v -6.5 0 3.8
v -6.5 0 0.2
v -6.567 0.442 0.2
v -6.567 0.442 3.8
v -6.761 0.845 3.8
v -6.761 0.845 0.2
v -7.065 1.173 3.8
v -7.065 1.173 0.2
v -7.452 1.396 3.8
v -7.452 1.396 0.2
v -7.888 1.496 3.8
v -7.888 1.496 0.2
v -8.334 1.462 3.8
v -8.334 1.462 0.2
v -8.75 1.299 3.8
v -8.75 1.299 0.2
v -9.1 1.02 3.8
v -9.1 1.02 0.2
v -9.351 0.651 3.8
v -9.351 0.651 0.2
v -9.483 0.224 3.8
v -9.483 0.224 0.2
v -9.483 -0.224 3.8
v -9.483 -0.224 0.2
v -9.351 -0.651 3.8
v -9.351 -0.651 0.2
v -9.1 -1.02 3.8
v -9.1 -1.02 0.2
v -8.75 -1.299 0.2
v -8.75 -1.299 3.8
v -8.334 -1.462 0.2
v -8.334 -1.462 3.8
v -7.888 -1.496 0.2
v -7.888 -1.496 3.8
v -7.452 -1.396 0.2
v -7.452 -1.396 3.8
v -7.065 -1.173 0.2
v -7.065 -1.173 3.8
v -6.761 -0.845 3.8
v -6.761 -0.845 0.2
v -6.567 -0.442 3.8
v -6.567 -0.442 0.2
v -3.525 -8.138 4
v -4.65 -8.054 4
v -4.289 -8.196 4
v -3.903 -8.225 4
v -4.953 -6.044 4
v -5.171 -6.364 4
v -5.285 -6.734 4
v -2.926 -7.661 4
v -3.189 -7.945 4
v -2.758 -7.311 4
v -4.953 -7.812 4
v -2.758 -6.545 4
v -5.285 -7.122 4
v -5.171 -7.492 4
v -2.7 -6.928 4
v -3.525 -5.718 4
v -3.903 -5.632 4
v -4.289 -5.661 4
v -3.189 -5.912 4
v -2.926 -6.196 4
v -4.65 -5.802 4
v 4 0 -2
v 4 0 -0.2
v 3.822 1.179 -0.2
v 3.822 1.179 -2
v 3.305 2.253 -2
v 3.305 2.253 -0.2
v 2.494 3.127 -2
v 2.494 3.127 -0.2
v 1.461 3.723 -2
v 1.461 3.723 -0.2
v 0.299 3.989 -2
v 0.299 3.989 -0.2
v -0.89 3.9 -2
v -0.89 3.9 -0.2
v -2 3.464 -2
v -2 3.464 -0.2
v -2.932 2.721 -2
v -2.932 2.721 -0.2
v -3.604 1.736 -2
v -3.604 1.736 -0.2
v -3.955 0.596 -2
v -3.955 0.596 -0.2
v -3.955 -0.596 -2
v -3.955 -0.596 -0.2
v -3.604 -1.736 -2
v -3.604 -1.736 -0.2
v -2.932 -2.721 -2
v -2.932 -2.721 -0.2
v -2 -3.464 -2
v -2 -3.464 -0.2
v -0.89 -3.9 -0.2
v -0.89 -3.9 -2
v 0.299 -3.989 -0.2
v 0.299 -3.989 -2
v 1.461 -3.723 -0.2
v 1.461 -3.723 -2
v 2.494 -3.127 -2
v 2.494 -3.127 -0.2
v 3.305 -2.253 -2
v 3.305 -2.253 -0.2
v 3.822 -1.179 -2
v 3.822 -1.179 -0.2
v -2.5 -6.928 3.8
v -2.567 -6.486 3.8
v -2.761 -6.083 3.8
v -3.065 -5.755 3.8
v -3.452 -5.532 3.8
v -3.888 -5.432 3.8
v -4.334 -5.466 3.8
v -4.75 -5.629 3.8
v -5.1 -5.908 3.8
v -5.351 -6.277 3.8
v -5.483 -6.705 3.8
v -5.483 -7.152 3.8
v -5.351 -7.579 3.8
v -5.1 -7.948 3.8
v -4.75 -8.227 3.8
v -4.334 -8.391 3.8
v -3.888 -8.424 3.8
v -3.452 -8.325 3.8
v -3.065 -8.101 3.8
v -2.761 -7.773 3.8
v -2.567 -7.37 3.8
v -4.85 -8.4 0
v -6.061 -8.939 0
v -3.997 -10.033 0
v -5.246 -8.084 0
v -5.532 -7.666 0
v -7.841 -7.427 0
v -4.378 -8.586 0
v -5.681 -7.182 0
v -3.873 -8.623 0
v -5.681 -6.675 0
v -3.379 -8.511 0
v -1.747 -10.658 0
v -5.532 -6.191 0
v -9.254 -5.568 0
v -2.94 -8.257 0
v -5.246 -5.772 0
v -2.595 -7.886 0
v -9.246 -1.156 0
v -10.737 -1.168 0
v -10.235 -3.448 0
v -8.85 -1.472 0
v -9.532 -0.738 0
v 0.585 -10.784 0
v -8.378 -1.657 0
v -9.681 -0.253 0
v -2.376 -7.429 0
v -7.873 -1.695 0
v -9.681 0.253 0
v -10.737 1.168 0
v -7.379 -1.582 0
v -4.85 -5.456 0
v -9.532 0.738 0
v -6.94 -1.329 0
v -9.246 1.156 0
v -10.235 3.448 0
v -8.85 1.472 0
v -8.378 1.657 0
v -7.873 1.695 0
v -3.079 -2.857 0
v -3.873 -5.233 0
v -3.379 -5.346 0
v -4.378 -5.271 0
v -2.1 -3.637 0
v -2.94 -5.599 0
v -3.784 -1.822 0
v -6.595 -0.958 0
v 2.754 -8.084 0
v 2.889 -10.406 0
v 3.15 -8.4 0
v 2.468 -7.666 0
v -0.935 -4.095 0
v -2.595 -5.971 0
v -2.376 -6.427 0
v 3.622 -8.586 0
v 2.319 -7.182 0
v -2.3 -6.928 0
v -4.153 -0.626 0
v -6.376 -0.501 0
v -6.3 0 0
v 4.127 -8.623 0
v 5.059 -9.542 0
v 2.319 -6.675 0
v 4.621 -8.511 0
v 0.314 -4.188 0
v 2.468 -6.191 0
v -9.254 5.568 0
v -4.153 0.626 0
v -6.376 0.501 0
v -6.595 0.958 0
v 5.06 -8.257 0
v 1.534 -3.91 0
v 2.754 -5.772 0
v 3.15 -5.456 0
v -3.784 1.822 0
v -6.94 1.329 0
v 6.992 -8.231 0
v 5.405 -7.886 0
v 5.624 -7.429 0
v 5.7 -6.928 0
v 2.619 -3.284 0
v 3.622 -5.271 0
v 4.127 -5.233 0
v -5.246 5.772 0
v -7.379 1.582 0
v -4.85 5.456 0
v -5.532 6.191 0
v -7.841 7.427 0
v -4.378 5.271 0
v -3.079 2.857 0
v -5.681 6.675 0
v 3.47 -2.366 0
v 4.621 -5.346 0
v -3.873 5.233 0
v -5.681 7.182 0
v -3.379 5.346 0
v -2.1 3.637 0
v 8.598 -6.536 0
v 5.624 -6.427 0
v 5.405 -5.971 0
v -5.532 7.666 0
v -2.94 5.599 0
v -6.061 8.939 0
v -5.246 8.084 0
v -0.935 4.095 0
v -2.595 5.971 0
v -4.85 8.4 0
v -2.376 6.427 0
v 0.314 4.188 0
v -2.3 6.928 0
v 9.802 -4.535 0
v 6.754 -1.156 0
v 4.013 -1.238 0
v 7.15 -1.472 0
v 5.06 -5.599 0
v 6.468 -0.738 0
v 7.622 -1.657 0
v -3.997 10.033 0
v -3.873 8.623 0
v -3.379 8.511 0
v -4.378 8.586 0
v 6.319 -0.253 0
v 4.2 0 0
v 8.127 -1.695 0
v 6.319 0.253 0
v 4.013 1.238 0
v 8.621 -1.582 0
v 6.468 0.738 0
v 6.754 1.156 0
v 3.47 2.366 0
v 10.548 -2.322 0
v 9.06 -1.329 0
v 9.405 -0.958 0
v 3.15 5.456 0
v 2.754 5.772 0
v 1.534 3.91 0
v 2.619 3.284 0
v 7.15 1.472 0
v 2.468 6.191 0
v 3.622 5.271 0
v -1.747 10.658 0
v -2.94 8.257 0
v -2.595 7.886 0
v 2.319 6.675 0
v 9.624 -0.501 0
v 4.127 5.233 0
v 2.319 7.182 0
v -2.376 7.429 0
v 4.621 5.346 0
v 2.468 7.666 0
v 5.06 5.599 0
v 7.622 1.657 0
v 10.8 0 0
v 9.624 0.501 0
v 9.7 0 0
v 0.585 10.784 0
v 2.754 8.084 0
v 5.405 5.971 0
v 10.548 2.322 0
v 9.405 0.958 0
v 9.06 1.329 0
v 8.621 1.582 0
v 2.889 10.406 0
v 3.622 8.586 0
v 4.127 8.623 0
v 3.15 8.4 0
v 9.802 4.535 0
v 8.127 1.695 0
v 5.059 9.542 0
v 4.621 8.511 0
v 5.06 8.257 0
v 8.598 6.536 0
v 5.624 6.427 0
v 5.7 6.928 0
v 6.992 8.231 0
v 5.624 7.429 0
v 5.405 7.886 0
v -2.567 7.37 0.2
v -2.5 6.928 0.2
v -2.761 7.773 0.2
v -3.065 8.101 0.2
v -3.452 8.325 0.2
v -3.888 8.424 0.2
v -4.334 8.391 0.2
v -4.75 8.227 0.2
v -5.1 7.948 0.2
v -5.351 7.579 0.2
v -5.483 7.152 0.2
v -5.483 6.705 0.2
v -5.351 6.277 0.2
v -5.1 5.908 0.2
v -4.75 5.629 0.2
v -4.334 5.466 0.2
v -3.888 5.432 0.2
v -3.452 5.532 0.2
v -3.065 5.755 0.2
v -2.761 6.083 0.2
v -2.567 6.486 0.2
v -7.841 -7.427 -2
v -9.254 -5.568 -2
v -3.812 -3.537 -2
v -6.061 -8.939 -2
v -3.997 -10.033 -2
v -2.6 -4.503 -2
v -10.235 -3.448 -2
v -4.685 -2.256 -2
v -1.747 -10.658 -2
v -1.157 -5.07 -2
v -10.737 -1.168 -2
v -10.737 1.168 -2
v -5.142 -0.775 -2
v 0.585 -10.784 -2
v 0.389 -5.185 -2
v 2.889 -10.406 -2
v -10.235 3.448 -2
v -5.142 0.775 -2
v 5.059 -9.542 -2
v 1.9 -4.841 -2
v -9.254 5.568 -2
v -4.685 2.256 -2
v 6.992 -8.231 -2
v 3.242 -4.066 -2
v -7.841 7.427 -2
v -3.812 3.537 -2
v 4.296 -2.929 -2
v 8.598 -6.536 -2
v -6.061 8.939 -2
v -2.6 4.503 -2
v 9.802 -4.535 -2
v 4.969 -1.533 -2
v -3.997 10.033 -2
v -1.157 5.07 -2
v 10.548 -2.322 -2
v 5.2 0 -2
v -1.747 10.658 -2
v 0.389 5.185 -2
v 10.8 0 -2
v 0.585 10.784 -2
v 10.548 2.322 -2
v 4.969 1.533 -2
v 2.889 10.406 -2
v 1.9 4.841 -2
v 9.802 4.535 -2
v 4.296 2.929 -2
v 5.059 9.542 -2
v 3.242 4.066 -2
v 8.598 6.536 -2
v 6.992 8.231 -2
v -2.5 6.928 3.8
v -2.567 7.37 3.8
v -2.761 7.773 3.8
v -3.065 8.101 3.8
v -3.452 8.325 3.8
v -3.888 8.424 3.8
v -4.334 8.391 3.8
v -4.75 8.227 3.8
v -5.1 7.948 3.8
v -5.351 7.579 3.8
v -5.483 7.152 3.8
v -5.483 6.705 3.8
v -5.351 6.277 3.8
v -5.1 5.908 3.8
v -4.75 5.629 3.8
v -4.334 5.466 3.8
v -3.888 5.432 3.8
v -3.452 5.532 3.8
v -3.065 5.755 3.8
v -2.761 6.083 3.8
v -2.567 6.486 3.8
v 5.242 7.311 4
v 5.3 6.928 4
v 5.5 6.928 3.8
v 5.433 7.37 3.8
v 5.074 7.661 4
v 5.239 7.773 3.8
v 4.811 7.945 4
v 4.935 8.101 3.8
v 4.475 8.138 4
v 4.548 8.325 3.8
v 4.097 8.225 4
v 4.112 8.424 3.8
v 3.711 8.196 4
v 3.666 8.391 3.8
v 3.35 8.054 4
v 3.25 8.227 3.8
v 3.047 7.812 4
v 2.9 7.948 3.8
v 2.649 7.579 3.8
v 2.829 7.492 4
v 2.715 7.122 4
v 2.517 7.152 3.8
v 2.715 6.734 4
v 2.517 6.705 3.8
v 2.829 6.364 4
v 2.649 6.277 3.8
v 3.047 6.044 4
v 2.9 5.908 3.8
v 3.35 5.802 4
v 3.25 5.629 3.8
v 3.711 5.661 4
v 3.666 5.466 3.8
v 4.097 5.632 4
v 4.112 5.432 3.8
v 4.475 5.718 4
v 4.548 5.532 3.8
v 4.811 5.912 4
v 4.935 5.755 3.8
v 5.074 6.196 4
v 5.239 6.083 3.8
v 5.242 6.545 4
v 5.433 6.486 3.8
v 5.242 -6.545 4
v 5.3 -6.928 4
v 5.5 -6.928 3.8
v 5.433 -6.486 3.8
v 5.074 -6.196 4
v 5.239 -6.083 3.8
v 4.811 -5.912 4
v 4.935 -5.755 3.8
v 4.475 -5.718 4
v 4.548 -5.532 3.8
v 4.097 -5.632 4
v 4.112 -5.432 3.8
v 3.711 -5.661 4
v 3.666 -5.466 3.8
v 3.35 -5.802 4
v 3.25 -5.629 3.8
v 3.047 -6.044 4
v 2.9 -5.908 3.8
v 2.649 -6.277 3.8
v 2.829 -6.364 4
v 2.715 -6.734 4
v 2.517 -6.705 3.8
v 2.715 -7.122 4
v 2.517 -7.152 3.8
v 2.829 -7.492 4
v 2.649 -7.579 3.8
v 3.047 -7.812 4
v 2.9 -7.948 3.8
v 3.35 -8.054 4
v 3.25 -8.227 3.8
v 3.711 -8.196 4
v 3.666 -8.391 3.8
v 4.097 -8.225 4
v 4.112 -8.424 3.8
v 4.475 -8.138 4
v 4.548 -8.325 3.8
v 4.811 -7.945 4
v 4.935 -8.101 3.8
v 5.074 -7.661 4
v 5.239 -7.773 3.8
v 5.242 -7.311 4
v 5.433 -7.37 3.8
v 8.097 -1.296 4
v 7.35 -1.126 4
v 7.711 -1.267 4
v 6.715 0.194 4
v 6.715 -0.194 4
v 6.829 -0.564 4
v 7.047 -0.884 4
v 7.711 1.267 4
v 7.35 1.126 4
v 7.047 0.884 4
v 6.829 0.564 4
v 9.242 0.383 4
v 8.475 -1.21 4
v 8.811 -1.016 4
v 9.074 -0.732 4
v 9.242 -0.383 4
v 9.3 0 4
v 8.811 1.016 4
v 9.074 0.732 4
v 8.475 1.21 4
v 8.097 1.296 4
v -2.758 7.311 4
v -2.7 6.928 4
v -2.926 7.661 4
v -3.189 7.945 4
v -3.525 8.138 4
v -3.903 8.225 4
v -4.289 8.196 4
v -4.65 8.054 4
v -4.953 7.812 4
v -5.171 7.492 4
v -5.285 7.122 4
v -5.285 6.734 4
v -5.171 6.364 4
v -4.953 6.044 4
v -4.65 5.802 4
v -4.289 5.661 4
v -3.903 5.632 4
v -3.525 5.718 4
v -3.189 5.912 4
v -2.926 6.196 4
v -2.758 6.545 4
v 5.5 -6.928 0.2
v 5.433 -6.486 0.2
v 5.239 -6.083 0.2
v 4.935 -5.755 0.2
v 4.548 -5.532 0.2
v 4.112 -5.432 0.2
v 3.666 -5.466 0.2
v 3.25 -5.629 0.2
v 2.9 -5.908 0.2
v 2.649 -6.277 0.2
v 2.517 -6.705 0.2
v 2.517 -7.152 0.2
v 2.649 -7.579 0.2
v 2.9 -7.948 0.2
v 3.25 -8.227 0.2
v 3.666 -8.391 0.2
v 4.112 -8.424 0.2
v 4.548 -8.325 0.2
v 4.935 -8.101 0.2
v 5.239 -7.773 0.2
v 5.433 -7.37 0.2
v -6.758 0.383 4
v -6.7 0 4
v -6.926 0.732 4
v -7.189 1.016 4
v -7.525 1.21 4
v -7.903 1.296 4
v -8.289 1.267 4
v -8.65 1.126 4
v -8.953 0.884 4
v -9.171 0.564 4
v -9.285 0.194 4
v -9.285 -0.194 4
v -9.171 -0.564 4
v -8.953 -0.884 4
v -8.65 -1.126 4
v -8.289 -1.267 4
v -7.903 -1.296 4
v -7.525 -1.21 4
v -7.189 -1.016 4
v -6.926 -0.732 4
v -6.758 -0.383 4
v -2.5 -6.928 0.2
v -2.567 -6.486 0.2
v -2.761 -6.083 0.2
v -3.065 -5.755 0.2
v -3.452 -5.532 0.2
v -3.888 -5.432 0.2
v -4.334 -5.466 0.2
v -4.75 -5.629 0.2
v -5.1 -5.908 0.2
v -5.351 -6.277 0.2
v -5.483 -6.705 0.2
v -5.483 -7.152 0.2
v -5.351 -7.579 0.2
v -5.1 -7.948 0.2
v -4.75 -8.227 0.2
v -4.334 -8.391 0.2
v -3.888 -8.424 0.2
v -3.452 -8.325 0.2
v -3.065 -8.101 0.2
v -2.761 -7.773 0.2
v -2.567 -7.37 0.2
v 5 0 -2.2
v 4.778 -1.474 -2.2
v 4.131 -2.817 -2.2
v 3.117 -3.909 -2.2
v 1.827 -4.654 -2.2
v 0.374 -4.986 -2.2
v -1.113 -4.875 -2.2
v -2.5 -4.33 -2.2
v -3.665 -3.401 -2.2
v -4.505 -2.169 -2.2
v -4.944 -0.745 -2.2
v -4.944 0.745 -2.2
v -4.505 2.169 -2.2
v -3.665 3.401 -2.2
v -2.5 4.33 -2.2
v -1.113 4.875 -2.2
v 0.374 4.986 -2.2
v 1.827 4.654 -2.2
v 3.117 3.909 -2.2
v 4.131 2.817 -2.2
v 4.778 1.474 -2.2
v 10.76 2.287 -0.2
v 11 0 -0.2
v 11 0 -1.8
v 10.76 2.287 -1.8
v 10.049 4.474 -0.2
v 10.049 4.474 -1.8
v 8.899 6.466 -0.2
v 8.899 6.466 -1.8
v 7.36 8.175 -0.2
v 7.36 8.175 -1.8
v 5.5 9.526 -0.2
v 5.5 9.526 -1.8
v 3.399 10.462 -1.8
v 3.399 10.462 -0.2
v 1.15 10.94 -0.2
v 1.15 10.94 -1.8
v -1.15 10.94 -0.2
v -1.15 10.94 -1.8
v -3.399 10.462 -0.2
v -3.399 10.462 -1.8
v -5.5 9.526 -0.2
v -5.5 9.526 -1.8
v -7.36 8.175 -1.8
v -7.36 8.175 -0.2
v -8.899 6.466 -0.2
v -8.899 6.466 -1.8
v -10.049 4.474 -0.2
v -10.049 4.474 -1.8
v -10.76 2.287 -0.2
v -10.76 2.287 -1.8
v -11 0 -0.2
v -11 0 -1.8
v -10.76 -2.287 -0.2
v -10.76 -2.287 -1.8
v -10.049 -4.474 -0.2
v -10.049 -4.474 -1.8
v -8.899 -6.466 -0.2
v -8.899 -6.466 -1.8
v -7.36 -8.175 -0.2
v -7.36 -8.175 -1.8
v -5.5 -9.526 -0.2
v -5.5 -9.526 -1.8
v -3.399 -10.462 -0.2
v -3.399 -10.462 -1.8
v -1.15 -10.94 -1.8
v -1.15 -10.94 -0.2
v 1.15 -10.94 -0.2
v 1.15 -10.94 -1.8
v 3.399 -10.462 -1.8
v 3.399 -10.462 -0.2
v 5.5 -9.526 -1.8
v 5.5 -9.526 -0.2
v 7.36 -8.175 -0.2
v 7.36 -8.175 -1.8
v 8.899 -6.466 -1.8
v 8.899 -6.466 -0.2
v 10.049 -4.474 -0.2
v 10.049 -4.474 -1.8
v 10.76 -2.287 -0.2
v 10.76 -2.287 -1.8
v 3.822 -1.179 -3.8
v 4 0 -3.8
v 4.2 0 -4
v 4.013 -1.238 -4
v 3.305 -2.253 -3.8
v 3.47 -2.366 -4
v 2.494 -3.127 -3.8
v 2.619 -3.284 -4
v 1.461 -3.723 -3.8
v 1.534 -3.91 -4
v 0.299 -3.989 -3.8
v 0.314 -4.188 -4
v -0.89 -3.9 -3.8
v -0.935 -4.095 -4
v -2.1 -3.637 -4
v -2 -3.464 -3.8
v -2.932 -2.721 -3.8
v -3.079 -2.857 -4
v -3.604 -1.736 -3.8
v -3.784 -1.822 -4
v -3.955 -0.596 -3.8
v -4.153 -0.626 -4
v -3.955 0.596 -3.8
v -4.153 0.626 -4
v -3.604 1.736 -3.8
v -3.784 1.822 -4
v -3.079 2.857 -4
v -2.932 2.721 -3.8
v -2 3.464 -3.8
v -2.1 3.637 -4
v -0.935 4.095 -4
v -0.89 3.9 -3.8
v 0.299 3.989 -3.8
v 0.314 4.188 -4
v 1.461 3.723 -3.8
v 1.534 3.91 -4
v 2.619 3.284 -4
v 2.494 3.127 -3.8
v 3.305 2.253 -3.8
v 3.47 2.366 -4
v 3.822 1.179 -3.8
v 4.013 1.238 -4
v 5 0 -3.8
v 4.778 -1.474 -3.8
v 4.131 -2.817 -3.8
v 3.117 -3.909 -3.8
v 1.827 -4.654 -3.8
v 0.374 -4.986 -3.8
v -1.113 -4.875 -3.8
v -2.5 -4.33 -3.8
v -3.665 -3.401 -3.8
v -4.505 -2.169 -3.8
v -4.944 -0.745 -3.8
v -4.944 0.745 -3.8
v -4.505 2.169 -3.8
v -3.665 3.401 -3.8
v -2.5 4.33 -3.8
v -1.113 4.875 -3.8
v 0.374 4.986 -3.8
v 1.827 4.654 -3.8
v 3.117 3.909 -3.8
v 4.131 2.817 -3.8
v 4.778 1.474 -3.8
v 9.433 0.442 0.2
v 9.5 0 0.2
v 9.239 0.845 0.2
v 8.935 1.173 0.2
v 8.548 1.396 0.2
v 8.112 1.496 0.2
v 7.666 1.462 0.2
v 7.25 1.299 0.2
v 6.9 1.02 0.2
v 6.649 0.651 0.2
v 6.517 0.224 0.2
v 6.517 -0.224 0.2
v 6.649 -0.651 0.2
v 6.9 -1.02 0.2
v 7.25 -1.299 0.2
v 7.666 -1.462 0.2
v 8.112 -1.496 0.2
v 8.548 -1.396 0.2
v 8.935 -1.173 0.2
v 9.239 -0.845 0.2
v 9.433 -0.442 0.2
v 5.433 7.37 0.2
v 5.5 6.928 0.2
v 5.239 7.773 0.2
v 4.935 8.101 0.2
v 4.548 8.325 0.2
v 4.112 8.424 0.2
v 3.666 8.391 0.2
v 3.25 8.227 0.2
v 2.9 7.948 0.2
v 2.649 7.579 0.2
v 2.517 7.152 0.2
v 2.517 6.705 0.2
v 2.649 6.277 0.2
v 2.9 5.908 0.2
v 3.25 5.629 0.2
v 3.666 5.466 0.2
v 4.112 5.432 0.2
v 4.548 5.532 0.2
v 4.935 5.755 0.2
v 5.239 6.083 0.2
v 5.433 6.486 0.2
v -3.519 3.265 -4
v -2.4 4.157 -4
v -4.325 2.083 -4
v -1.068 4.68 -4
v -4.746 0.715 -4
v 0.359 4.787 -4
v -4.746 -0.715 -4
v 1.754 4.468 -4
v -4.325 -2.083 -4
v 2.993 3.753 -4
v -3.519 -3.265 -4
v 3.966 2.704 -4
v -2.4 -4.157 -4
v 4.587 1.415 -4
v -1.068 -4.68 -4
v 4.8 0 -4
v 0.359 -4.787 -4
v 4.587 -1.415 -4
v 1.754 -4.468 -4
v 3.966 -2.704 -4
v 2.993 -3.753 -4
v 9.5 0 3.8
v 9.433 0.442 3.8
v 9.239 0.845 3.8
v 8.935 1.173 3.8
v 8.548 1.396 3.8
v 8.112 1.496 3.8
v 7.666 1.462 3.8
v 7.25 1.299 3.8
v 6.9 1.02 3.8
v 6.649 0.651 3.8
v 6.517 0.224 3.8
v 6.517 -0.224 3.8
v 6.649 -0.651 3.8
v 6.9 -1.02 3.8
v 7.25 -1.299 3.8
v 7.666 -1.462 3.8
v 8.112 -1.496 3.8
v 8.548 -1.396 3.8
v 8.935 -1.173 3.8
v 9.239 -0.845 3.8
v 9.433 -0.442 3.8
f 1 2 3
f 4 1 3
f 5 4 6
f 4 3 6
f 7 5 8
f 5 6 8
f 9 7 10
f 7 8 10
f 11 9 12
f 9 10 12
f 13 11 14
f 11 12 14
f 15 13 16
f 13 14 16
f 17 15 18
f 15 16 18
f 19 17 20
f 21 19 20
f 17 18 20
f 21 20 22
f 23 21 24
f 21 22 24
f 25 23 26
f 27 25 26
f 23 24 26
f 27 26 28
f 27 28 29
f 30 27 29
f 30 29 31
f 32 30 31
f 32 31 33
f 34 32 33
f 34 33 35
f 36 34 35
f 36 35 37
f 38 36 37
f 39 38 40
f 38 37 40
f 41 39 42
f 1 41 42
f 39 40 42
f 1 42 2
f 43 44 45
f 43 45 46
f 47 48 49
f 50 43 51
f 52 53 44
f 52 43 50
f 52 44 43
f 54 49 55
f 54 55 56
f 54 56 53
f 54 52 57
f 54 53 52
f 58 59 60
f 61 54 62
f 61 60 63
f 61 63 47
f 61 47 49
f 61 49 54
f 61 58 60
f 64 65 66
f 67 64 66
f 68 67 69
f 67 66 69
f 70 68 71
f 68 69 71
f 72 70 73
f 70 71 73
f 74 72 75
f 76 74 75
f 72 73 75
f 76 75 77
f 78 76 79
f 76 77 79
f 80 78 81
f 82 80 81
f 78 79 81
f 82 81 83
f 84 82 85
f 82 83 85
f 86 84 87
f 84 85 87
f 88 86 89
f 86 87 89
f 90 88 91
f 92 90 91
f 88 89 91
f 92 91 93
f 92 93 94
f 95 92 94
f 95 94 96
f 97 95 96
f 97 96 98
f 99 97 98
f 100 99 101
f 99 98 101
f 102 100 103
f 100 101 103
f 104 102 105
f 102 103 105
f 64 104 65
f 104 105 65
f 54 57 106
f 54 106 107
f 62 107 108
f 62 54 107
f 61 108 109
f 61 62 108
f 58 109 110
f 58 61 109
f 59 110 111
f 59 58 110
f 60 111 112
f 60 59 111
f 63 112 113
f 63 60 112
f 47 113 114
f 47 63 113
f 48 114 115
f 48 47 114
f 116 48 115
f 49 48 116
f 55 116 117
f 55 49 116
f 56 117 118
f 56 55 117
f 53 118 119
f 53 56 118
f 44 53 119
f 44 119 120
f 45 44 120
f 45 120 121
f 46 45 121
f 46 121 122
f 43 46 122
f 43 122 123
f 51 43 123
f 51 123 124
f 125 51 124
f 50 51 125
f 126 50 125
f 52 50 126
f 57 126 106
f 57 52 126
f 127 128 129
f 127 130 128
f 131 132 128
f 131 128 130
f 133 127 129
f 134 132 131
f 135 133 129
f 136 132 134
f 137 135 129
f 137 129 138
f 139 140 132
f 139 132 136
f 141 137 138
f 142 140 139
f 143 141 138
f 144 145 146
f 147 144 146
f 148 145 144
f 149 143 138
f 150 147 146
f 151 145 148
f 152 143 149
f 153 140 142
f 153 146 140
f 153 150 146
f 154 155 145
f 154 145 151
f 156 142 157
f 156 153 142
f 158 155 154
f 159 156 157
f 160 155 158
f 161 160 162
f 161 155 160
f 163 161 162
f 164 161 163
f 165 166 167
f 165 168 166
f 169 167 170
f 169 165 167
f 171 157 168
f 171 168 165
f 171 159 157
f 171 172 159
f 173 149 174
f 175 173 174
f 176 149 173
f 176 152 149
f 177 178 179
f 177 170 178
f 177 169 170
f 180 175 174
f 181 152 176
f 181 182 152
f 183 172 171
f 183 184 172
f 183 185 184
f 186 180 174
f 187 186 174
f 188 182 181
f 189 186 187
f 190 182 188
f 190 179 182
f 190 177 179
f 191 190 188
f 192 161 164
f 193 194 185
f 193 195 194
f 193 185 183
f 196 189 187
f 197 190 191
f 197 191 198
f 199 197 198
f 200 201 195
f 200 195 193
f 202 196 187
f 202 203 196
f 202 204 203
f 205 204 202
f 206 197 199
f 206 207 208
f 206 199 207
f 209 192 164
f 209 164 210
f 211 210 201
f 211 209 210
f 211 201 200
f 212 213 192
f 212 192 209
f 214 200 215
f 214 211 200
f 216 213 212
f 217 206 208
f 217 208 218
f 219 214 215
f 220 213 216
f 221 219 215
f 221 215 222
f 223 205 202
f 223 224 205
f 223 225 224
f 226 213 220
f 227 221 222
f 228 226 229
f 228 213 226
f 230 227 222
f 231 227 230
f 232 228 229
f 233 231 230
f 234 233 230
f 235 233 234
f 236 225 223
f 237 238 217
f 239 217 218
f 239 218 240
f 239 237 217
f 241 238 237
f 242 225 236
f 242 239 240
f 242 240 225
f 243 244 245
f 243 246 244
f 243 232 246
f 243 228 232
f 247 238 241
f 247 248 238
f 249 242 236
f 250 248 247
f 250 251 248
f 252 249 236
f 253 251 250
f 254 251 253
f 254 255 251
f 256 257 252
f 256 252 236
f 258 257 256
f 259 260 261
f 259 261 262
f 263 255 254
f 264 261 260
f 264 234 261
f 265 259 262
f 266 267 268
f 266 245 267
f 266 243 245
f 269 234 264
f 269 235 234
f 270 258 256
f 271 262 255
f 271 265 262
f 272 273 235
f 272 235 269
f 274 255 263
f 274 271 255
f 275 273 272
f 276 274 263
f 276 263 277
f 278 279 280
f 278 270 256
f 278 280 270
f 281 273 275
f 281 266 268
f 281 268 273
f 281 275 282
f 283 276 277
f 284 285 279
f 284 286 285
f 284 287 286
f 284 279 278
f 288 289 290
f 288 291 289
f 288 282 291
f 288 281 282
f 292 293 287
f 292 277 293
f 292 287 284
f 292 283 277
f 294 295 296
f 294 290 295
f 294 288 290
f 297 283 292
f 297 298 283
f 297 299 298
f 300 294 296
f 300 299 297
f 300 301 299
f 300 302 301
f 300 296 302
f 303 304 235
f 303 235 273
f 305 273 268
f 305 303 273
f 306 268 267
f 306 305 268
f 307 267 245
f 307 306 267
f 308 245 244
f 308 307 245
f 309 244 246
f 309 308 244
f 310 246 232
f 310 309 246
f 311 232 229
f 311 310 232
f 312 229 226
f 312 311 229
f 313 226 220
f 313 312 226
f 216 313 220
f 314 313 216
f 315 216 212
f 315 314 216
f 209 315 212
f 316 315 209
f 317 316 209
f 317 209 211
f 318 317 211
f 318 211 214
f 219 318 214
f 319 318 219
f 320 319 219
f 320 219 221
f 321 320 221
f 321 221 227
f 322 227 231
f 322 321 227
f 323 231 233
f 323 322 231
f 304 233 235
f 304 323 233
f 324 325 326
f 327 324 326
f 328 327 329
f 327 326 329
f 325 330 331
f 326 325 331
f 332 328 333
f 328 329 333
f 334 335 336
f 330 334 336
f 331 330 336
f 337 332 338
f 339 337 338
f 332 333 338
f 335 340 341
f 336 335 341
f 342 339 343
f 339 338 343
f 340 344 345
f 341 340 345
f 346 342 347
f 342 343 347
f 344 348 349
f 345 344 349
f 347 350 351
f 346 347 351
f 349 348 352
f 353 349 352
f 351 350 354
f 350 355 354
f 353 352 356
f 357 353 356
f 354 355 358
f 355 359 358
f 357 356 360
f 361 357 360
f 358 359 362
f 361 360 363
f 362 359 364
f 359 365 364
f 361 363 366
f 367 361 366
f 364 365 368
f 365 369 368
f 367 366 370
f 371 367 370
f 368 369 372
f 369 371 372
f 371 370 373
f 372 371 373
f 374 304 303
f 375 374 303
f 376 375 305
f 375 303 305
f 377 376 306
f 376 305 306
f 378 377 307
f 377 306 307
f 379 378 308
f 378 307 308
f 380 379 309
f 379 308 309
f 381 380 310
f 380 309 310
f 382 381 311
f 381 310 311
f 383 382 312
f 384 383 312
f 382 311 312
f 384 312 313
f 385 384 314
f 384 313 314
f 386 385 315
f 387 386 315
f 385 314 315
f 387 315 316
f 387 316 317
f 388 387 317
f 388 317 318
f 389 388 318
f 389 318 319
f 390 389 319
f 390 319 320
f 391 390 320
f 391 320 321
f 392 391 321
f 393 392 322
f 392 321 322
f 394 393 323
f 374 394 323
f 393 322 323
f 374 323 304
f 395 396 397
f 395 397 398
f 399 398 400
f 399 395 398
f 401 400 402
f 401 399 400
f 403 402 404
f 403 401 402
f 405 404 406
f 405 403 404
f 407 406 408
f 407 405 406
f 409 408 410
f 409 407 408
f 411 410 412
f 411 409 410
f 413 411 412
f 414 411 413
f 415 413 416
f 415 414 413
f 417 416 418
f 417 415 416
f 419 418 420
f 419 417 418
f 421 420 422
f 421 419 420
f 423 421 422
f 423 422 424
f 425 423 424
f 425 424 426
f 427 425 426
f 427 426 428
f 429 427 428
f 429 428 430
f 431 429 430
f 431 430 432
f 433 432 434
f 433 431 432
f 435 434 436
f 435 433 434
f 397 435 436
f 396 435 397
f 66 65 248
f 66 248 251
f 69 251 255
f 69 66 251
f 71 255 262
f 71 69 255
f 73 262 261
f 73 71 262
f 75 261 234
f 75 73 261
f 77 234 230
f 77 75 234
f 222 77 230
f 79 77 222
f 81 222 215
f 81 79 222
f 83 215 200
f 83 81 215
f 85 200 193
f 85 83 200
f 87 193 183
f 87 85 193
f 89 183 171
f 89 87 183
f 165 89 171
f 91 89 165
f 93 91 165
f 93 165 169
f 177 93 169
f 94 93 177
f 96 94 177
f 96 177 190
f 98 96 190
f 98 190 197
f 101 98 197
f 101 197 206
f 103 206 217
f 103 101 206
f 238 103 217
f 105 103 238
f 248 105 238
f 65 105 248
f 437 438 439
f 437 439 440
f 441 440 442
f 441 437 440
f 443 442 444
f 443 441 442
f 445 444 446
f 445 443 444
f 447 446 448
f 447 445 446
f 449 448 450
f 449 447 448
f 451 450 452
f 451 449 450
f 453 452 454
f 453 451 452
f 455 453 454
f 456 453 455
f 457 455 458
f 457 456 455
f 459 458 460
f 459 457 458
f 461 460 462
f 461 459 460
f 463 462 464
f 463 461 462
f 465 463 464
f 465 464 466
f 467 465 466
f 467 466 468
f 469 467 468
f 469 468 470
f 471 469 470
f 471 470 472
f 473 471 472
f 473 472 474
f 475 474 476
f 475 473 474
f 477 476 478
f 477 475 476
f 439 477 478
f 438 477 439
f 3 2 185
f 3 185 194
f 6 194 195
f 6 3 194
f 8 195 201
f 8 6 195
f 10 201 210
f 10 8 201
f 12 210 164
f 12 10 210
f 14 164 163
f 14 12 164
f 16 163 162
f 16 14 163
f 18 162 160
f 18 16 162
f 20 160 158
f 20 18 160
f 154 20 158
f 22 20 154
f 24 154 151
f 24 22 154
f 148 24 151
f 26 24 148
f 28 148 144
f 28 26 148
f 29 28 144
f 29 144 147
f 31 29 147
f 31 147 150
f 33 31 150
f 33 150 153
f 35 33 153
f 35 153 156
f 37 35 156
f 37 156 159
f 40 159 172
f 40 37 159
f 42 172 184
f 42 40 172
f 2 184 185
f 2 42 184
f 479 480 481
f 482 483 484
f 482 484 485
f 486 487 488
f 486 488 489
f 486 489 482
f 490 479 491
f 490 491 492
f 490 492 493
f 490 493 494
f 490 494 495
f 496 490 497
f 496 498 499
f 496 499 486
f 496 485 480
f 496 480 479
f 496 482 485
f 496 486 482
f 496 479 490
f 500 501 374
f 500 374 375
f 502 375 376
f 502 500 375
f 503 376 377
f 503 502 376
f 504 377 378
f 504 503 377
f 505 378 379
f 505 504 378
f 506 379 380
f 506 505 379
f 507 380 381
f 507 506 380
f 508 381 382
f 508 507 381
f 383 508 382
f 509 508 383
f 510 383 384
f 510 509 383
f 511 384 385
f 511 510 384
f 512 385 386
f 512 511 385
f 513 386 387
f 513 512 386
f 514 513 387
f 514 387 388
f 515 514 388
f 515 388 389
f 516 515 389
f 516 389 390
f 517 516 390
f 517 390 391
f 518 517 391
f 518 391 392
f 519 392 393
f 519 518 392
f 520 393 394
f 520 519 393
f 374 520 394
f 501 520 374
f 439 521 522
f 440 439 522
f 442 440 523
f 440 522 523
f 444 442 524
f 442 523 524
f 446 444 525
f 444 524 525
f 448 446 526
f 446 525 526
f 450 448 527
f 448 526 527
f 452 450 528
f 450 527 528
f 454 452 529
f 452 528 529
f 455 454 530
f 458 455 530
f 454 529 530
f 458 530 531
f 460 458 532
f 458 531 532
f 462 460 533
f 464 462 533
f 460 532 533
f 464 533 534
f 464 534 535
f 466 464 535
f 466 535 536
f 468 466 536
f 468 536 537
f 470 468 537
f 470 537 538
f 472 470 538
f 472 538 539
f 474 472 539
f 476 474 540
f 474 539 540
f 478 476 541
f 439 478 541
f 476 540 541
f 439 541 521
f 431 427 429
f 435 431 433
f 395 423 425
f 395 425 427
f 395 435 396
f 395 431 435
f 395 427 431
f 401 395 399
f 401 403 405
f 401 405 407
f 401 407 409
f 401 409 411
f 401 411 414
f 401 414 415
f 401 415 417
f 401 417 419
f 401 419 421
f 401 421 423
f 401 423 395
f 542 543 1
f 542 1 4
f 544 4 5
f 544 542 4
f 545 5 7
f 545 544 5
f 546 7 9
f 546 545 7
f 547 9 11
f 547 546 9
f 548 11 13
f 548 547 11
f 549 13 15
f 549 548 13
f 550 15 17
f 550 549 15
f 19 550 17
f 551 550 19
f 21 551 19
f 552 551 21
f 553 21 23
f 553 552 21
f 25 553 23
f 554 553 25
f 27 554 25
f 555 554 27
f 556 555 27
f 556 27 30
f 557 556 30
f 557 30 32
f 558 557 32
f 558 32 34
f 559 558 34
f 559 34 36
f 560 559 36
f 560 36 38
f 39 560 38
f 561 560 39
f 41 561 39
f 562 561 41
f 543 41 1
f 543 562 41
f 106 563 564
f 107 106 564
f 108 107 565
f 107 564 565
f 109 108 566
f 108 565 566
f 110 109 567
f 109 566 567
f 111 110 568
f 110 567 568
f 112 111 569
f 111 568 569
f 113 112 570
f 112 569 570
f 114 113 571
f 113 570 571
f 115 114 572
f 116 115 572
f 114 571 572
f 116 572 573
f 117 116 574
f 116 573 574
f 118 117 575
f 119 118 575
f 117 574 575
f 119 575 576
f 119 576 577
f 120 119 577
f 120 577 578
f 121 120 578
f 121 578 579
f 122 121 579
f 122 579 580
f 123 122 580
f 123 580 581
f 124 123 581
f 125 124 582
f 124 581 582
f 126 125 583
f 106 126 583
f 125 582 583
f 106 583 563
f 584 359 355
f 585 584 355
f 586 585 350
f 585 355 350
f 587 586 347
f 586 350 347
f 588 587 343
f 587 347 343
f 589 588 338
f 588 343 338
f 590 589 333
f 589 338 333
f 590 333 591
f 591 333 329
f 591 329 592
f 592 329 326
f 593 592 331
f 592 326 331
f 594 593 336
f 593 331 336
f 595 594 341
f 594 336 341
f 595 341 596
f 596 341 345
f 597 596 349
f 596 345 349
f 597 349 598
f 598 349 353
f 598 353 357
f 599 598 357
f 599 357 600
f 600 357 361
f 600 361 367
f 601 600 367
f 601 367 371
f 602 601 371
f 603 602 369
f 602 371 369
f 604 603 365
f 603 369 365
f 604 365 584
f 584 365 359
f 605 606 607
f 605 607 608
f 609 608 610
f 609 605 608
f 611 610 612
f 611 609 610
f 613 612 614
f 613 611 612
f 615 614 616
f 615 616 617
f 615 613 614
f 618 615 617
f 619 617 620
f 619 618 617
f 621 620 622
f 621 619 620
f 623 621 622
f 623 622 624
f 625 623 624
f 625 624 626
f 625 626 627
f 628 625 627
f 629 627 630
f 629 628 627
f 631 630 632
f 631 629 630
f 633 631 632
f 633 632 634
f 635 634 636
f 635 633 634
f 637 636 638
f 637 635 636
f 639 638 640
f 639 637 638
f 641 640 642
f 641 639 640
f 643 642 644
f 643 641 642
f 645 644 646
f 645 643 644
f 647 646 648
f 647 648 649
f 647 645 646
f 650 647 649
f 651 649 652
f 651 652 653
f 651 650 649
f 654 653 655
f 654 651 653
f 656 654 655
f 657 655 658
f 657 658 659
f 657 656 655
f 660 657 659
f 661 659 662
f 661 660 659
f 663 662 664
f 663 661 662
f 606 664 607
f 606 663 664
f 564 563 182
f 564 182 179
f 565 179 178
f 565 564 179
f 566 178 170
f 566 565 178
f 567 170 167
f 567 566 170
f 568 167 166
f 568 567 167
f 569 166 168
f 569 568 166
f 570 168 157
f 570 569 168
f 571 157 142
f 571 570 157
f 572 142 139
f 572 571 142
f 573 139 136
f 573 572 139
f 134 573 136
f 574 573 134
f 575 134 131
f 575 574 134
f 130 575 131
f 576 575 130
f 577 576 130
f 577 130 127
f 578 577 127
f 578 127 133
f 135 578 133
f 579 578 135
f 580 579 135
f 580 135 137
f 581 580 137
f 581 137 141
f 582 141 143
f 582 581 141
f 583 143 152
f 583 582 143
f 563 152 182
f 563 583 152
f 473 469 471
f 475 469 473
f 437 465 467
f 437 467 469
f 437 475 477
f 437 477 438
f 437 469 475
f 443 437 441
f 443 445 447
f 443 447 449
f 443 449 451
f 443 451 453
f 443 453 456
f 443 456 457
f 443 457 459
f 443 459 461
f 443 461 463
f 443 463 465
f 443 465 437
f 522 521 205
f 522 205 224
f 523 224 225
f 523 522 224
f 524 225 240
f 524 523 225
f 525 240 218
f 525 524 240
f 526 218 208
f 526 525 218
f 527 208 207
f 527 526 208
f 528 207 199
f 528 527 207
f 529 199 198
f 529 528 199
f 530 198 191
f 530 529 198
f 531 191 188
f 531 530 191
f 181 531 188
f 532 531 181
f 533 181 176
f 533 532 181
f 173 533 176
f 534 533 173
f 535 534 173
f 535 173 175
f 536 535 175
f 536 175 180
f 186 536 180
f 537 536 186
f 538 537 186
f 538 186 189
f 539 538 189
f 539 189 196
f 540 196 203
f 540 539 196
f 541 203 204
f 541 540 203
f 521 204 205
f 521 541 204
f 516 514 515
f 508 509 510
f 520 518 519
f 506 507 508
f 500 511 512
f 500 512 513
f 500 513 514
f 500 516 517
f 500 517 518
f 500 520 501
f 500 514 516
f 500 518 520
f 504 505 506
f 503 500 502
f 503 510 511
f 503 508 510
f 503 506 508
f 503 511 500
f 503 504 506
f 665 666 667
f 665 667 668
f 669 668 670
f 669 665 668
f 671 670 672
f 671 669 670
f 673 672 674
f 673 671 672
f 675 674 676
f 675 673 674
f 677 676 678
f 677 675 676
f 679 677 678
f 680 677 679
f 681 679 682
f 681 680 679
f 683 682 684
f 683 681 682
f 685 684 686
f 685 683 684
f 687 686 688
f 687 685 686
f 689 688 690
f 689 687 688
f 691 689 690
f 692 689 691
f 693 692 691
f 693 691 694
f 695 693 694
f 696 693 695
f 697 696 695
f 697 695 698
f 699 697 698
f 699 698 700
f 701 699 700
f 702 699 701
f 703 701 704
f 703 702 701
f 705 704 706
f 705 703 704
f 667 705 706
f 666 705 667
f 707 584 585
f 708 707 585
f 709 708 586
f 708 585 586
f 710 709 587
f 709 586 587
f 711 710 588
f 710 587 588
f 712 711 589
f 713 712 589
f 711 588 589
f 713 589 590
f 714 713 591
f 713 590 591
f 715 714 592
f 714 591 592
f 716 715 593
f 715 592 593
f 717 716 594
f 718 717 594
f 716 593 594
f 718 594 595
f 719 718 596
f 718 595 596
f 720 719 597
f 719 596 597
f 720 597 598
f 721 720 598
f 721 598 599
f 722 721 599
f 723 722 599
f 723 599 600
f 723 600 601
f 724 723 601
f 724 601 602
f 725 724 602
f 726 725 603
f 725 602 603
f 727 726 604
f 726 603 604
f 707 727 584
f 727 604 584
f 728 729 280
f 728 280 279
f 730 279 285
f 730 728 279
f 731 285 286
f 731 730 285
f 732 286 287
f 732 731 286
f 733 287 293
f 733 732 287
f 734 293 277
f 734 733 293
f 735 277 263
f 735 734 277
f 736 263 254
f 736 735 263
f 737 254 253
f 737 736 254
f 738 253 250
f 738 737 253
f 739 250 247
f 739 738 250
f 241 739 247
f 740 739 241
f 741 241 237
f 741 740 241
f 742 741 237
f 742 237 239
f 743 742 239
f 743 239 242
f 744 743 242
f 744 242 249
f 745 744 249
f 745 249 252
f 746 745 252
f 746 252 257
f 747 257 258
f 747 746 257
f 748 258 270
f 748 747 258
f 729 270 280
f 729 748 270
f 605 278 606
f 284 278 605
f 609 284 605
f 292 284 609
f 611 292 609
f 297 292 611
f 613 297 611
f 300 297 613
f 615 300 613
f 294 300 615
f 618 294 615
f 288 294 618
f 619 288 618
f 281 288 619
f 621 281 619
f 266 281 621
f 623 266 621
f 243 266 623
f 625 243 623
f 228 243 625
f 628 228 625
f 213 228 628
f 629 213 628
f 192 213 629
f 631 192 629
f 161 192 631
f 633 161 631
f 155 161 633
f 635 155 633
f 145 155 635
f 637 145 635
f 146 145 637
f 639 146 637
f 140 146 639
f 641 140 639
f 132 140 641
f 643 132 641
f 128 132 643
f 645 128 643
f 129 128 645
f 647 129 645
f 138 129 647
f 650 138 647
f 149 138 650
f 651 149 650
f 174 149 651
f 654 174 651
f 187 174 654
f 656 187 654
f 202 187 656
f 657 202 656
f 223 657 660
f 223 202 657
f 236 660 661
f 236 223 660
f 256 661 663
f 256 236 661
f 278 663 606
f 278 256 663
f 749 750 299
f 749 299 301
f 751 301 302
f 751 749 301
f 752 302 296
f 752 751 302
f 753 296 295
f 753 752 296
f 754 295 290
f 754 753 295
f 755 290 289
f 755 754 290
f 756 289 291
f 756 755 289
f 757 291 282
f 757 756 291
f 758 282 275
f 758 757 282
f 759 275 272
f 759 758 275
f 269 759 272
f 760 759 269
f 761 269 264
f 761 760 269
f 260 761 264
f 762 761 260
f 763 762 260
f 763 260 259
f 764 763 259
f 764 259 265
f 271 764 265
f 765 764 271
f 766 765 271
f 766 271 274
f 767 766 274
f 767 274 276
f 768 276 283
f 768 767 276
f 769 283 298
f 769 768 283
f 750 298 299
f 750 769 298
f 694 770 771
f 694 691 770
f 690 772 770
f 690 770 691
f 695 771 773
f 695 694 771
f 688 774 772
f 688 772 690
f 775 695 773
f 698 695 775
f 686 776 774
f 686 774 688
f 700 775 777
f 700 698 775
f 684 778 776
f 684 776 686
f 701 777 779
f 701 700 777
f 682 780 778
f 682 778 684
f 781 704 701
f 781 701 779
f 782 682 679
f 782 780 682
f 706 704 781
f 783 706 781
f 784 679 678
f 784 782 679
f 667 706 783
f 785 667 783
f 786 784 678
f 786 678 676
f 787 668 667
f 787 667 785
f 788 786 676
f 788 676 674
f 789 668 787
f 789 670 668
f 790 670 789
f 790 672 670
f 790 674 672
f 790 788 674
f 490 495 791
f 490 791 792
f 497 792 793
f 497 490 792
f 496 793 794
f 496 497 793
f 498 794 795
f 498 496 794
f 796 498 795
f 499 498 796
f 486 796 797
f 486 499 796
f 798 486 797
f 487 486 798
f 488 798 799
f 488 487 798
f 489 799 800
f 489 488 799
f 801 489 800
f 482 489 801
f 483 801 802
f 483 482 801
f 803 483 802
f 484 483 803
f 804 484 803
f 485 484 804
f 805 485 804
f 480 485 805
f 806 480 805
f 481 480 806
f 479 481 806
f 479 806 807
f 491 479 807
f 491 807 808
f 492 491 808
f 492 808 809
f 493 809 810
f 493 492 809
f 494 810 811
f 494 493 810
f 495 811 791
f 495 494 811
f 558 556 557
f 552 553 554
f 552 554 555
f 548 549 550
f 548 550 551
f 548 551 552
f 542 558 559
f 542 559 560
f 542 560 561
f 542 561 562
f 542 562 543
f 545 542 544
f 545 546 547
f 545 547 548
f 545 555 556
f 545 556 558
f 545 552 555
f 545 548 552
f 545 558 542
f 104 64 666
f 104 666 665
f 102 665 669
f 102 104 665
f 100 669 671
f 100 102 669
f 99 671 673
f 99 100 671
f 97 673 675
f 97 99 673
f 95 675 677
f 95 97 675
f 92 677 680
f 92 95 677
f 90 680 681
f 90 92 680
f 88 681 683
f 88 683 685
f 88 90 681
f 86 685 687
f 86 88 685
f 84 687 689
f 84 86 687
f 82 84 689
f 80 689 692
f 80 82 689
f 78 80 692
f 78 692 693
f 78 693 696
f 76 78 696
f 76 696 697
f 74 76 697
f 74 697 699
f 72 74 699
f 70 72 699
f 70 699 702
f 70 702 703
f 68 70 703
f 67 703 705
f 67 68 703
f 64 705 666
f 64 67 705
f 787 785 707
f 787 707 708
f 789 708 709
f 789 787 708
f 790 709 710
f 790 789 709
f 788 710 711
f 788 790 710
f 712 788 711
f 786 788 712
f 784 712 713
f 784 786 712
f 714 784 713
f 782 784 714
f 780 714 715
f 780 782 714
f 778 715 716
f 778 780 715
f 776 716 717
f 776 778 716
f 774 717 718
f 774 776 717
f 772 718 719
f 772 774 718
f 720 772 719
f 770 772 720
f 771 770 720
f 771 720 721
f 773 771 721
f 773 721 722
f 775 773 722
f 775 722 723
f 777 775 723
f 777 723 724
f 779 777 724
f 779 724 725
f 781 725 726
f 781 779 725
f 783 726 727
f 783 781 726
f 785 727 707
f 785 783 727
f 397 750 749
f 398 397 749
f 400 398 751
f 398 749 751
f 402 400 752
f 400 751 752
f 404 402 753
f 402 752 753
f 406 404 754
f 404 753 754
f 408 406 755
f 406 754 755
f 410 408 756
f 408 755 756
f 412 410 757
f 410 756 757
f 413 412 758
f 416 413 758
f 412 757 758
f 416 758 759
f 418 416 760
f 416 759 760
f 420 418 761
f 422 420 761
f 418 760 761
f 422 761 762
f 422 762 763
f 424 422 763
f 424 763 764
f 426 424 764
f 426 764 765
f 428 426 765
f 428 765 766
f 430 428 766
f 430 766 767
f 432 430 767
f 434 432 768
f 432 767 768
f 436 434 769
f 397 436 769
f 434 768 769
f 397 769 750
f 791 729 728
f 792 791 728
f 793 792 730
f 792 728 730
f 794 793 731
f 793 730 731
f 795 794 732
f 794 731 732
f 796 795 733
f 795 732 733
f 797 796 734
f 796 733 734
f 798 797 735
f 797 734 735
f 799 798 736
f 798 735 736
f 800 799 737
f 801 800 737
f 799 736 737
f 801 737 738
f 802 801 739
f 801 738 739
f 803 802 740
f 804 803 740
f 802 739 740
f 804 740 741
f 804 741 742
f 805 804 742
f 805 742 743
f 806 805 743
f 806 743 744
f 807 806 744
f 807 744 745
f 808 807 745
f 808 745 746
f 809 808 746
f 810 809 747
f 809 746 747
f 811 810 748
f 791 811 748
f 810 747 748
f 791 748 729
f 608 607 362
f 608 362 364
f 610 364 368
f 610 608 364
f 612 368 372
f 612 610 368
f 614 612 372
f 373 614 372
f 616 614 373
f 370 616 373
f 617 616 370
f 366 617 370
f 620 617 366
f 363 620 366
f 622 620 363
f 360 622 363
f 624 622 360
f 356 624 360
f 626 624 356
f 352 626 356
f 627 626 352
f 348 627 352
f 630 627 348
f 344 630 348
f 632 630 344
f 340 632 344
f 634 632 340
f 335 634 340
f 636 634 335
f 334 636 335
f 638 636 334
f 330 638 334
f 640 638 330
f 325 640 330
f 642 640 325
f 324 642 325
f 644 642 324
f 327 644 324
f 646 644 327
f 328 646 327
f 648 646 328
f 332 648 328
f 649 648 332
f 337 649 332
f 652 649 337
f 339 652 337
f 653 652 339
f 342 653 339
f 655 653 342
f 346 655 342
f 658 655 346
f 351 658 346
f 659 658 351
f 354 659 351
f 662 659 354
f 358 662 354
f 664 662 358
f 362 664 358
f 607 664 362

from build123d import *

# Parameters (mm, degrees)
F0_R     = 1.5
F1_DEPTH = 4
F0_R_2   = 11
F0_R_3   = 4
F2_DEPTH = 2
F3_R     = 5
F3_R_2   = 4
F4_DEPTH = 2
F5_SIZE  = 0.2


with BuildPart() as f1:
    # F0 (on Top) → F1 (new body)
    with BuildSketch(Plane.XY):
        with Locations((-8, 0)):
            Circle(F0_R)
    extrude(amount=F1_DEPTH)



with BuildPart() as f1b:
    # F0 (on Top) → F1, piece 2 (new body)
    with BuildSketch(Plane.XY):
        with Locations((-4, 6.9282032303)):
            Circle(F0_R)
    extrude(amount=F1_DEPTH)


with BuildPart() as f1c:
    # F0 (on Top) → F1, piece 3 (new body)
    with BuildSketch(Plane.XY):
        with Locations((4, 6.9282032303)):
            Circle(F0_R)
    extrude(amount=F1_DEPTH)


with BuildPart() as f1d:
    # F0 (on Top) → F1, piece 4 (new body)
    with BuildSketch(Plane.XY):
        with Locations((8, 0)):
            Circle(F0_R)
    extrude(amount=F1_DEPTH)


with BuildPart() as f1e:
    # F0 (on Top) → F1, piece 5 (new body)
    with BuildSketch(Plane.XY):
        with Locations((4, -6.9282032303)):
            Circle(F0_R)
    extrude(amount=F1_DEPTH)


with BuildPart() as f1f:
    # F0 (on Top) → F1, piece 6 (new body)
    with BuildSketch(Plane.XY):
        with Locations((-4, -6.9282032303)):
            Circle(F0_R)
    extrude(amount=F1_DEPTH)


with BuildPart() as f1_1:
    add(f1.part)

    add(f1b.part)  # F2 merges F1b

    add(f1c.part)  # F2 merges F1c

    add(f1d.part)  # F2 merges F1d

    add(f1e.part)  # F2 merges F1e

    add(f1f.part)  # F2 merges F1f
    # F0 (on Top) → F2 (join)
    with BuildSketch(Plane.XY):
        Circle(F0_R_2)
        with Locations((-4, -6.9282032303)):
            Circle(F0_R, mode=Mode.SUBTRACT)
        with Locations((4, -6.9282032303)):
            Circle(F0_R, mode=Mode.SUBTRACT)
        with Locations((-8, 0)):
            Circle(F0_R, mode=Mode.SUBTRACT)
        with Locations((-4, 6.9282032303)):
            Circle(F0_R, mode=Mode.SUBTRACT)
        Circle(F0_R_3, mode=Mode.SUBTRACT)
        with Locations((8, 0)):
            Circle(F0_R, mode=Mode.SUBTRACT)
        with Locations((4, 6.9282032303)):
            Circle(F0_R, mode=Mode.SUBTRACT)
        with Locations((4, -6.9282032303)):
            Circle(F0_R)
        with Locations((8, 0)):
            Circle(F0_R)
        with Locations((4, 6.9282032303)):
            Circle(F0_R)
        with Locations((-4, 6.9282032303)):
            Circle(F0_R)
        with Locations((-8, 0)):
            Circle(F0_R)
        with Locations((-4, -6.9282032303)):
            Circle(F0_R)
    extrude(amount=-F2_DEPTH)

    # F3 (on face) → F4 (join)
    with BuildSketch(Plane(origin=(0, 0, -2), x_dir=(1, 0, 0), z_dir=(0, 0, -1))):
        Circle(F3_R)
        Circle(F3_R_2, mode=Mode.SUBTRACT)
    extrude(amount=F4_DEPTH)

    # F5
    f5_edges = [f1_1.edges().sort_by_distance(p)[0] for p in [
        (-11, 0, 0),
        (-5.5, -6.928203, 0),
        (-9.5, 0, 0),
        (2.5, -6.928203, 0),
        (-4, 0, 0),
        (6.5, 0, 0),
        (-5.5, 6.928203, 0),
        (2.5, 6.928203, 0),
        (6.5, 0, 4),
        (2.5, -6.928203, 4),
        (-5.5, -6.928203, 4),
        (-9.5, 0, 4),
        (-5.5, 6.928203, 4),
        (2.5, 6.928203, 4),
        (-4, 0, -4),
        (-5, 0, -4),
        (-5, 0, -2),
        (-11, 0, -2),
    ]]
    chamfer(f5_edges, length=F5_SIZE)


solid = f1_1.part
